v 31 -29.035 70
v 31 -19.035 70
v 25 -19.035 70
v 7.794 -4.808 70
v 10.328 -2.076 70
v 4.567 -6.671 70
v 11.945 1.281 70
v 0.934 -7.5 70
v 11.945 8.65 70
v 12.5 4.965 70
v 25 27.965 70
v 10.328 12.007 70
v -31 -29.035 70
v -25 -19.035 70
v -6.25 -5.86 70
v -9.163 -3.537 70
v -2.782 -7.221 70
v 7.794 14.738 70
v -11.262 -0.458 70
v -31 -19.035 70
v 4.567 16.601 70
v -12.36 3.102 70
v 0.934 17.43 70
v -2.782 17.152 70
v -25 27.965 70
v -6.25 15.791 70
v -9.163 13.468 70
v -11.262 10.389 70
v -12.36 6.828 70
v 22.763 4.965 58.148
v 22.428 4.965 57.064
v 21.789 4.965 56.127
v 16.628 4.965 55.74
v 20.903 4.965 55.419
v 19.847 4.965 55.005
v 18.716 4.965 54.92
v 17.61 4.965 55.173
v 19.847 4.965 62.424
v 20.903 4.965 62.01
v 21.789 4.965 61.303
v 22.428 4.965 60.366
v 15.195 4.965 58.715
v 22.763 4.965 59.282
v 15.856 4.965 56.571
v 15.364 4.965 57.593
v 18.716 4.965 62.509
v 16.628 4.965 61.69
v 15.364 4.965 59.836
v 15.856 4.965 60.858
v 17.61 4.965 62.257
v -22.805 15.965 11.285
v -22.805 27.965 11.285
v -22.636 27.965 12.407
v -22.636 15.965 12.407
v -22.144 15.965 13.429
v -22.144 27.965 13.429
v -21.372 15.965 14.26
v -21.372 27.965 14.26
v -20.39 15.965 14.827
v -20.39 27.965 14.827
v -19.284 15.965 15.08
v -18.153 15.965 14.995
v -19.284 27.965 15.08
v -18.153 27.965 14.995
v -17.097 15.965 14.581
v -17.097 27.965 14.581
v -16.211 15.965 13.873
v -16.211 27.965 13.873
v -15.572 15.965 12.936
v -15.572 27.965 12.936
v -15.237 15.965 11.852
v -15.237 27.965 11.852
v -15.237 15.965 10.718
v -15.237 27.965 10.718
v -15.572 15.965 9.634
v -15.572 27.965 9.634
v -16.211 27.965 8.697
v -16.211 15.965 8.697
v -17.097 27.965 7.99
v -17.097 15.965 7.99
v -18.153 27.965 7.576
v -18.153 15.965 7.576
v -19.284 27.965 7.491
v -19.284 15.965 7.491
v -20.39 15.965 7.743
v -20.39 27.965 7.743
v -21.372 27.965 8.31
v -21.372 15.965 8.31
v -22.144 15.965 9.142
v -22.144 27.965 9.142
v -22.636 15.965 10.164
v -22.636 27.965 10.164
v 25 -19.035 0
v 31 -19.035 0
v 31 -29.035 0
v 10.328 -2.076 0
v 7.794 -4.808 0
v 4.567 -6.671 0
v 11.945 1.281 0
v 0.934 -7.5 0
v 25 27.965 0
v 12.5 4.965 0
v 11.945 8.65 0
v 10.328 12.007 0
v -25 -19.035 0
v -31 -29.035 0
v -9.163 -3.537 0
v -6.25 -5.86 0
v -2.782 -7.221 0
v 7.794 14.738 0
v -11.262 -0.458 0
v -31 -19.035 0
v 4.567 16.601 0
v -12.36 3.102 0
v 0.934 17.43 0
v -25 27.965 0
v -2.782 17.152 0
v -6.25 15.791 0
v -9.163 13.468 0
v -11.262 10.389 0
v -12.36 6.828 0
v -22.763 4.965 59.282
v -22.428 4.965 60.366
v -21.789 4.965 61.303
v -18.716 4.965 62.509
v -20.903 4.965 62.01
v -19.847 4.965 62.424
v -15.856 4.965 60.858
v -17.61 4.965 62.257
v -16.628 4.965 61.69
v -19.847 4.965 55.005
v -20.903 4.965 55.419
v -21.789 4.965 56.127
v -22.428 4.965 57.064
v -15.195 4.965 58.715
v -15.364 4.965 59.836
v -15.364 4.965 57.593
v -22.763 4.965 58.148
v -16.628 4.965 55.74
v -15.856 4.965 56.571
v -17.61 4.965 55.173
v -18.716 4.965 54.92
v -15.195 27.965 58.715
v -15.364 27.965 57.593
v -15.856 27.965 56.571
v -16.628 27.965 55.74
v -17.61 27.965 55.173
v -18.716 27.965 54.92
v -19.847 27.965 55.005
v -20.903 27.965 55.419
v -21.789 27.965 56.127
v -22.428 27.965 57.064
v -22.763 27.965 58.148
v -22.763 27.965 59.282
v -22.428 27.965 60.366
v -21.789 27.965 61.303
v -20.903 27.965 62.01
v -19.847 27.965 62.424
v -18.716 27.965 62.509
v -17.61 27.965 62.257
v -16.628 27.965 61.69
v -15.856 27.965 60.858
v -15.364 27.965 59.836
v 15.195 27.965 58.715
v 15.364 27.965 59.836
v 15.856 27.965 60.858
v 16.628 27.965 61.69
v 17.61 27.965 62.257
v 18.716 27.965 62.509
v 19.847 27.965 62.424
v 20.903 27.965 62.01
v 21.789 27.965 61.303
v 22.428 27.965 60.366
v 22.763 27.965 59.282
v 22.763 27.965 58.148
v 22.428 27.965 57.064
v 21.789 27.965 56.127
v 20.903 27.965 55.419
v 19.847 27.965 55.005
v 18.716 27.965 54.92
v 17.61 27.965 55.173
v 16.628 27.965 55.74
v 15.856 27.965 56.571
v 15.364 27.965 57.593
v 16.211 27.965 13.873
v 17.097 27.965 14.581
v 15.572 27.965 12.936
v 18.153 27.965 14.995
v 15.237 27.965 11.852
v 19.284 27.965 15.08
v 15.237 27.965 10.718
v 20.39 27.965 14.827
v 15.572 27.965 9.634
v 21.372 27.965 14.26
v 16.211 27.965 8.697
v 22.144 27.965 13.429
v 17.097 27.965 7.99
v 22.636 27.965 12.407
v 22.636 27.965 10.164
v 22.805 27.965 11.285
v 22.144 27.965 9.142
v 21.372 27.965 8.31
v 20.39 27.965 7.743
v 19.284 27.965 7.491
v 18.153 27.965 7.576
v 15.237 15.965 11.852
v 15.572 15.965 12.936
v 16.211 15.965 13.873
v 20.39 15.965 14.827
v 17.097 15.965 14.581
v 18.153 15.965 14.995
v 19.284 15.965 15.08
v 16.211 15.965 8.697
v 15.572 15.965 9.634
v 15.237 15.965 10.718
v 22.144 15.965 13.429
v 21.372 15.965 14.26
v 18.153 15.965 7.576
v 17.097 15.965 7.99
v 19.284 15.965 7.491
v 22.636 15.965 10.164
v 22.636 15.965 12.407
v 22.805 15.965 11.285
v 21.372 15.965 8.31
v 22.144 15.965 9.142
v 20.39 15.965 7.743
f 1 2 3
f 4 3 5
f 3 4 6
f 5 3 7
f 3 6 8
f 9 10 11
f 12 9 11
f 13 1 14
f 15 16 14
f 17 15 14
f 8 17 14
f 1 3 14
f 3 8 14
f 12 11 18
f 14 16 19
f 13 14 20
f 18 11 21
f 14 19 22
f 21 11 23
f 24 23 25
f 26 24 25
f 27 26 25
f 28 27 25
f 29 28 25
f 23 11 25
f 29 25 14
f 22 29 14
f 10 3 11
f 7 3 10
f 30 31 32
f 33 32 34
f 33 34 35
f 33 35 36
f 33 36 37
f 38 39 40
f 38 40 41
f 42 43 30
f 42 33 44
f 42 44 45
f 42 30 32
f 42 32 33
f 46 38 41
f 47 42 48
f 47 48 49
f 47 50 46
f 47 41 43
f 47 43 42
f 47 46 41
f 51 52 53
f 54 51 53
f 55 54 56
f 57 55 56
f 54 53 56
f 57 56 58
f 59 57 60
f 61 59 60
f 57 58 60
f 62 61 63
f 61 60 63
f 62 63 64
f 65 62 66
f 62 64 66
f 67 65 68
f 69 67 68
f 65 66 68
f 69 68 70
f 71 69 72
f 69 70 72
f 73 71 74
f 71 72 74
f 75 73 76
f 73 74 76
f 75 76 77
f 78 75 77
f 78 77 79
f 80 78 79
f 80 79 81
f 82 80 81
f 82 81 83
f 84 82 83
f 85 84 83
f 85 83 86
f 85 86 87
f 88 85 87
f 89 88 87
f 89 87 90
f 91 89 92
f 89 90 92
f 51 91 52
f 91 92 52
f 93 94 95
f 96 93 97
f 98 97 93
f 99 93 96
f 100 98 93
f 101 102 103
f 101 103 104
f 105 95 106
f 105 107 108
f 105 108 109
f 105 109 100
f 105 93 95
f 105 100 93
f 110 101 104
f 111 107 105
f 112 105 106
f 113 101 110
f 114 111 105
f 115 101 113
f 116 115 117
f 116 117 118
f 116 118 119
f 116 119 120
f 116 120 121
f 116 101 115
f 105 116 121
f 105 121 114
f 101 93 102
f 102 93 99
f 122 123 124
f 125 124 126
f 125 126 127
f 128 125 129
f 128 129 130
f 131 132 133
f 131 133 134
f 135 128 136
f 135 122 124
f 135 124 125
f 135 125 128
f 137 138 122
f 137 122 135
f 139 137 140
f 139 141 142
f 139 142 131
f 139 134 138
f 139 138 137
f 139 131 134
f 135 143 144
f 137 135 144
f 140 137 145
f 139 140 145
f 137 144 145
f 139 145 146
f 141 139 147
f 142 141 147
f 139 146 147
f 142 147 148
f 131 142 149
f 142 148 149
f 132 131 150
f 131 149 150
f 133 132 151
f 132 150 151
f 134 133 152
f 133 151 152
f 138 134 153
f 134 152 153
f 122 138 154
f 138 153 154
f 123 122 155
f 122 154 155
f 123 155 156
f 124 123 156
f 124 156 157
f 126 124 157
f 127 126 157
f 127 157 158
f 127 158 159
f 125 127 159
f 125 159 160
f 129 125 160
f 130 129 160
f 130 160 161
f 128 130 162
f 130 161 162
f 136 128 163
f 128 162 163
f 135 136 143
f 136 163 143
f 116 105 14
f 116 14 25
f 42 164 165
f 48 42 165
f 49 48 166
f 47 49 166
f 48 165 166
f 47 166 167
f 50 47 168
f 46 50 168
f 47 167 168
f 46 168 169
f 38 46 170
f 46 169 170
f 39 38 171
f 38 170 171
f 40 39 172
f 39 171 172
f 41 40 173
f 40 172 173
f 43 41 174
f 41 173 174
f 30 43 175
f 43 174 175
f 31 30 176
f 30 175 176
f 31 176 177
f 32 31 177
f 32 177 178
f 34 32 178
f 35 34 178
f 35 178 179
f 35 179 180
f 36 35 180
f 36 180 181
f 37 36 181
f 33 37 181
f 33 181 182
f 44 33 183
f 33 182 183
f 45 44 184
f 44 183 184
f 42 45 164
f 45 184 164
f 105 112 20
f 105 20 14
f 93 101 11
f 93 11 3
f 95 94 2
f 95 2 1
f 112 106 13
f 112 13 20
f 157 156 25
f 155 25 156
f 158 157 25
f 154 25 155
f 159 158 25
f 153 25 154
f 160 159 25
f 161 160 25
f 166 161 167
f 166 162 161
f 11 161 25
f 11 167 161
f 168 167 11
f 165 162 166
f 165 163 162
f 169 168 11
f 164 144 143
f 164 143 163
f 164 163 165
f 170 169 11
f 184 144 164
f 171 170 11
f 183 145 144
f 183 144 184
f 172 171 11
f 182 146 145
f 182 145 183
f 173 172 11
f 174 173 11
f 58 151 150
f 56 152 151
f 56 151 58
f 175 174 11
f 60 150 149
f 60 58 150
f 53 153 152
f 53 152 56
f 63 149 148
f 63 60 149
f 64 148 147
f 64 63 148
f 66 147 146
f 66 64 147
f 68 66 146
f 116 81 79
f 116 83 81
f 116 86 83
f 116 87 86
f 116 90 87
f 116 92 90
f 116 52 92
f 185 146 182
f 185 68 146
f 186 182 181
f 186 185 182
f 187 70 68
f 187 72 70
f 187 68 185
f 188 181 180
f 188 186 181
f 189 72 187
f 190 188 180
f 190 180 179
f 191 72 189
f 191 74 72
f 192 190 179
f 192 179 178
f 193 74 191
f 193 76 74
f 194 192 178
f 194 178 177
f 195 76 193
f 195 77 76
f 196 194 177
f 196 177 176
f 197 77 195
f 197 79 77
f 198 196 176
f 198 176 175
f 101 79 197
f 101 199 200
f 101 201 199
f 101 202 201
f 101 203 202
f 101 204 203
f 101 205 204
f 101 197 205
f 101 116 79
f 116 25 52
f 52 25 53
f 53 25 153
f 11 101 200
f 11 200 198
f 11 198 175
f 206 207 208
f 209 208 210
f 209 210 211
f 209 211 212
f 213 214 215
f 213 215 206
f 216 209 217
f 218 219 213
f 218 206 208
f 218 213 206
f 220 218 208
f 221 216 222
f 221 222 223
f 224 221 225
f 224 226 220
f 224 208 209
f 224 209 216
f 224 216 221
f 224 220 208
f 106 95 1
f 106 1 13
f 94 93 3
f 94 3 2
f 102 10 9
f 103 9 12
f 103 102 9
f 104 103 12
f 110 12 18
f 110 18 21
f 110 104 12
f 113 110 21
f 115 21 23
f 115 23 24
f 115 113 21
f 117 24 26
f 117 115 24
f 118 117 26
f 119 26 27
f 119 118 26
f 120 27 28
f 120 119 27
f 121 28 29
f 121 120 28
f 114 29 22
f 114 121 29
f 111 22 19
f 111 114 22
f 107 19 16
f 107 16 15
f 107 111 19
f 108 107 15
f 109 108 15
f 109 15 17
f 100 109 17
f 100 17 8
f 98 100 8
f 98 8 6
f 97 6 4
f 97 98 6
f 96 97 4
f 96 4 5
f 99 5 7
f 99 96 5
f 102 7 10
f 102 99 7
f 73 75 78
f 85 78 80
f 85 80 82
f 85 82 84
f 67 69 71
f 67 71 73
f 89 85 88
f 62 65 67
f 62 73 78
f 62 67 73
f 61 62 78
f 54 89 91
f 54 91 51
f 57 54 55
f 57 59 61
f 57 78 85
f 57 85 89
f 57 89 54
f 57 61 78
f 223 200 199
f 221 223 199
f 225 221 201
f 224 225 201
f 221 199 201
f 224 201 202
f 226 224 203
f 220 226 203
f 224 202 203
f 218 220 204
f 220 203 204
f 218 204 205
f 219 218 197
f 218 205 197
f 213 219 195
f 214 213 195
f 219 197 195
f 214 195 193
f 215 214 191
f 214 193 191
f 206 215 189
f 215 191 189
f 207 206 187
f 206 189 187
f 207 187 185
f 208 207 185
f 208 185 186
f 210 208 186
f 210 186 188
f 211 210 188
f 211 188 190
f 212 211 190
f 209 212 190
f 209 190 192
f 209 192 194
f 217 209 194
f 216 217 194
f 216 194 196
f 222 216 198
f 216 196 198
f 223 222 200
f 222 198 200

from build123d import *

# Parameters (mm, degrees)
SKETCH1_R           = 12.5
BOSS_EXTRUDE1_DEPTH = 70
SKETCH2_R           = 3.805013563
CUT_EXTRUDE1_DEPTH  = 23
SKETCH3_R           = 3.805013563
CUT_EXTRUDE2_DEPTH  = 12


with BuildPart() as part:
    # Sketch1 → Boss-Extrude1 (new body)
    with BuildSketch(Plane.XY):
        Polygon((25, -19.03462444), (31, -19.03462444), (31, -29.03462444), (-31, -29.03462444), (-31, -19.03462444), (-25, -19.03462444), (-25, 27.96537556), (25, 27.96537556), align=None)
        with Locations((0, 4.96537556)):
            Circle(SKETCH1_R, mode=Mode.SUBTRACT)
    extrude(amount=BOSS_EXTRUDE1_DEPTH)

    # Sketch2 → Cut-Extrude1 (cut)
    with BuildSketch(Plane(origin=(0, 27.96537556, 0), x_dir=(1, 0, 0), z_dir=(0, 1, 0))):
        with Locations(Location((19, -58.714630835, 0), (0, 0, 180))):
            Circle(SKETCH2_R)
        with Locations((-19, -58.714630835)):
            Circle(SKETCH2_R)
    extrude(amount=-CUT_EXTRUDE1_DEPTH, mode=Mode.SUBTRACT)

    # Sketch3 → Cut-Extrude2 (cut)
    with BuildSketch(Plane(origin=(0, 27.96537556, 0), x_dir=(1, 0, 0), z_dir=(0, 1, 0))):
        with Locations((19, -11.285369165)):
            Circle(SKETCH3_R)
        with Locations(Location((-19, -11.285369165, 0), (0, 0, 180))):
            Circle(SKETCH3_R)
    extrude(amount=-CUT_EXTRUDE2_DEPTH, mode=Mode.SUBTRACT)


solid = part.part
